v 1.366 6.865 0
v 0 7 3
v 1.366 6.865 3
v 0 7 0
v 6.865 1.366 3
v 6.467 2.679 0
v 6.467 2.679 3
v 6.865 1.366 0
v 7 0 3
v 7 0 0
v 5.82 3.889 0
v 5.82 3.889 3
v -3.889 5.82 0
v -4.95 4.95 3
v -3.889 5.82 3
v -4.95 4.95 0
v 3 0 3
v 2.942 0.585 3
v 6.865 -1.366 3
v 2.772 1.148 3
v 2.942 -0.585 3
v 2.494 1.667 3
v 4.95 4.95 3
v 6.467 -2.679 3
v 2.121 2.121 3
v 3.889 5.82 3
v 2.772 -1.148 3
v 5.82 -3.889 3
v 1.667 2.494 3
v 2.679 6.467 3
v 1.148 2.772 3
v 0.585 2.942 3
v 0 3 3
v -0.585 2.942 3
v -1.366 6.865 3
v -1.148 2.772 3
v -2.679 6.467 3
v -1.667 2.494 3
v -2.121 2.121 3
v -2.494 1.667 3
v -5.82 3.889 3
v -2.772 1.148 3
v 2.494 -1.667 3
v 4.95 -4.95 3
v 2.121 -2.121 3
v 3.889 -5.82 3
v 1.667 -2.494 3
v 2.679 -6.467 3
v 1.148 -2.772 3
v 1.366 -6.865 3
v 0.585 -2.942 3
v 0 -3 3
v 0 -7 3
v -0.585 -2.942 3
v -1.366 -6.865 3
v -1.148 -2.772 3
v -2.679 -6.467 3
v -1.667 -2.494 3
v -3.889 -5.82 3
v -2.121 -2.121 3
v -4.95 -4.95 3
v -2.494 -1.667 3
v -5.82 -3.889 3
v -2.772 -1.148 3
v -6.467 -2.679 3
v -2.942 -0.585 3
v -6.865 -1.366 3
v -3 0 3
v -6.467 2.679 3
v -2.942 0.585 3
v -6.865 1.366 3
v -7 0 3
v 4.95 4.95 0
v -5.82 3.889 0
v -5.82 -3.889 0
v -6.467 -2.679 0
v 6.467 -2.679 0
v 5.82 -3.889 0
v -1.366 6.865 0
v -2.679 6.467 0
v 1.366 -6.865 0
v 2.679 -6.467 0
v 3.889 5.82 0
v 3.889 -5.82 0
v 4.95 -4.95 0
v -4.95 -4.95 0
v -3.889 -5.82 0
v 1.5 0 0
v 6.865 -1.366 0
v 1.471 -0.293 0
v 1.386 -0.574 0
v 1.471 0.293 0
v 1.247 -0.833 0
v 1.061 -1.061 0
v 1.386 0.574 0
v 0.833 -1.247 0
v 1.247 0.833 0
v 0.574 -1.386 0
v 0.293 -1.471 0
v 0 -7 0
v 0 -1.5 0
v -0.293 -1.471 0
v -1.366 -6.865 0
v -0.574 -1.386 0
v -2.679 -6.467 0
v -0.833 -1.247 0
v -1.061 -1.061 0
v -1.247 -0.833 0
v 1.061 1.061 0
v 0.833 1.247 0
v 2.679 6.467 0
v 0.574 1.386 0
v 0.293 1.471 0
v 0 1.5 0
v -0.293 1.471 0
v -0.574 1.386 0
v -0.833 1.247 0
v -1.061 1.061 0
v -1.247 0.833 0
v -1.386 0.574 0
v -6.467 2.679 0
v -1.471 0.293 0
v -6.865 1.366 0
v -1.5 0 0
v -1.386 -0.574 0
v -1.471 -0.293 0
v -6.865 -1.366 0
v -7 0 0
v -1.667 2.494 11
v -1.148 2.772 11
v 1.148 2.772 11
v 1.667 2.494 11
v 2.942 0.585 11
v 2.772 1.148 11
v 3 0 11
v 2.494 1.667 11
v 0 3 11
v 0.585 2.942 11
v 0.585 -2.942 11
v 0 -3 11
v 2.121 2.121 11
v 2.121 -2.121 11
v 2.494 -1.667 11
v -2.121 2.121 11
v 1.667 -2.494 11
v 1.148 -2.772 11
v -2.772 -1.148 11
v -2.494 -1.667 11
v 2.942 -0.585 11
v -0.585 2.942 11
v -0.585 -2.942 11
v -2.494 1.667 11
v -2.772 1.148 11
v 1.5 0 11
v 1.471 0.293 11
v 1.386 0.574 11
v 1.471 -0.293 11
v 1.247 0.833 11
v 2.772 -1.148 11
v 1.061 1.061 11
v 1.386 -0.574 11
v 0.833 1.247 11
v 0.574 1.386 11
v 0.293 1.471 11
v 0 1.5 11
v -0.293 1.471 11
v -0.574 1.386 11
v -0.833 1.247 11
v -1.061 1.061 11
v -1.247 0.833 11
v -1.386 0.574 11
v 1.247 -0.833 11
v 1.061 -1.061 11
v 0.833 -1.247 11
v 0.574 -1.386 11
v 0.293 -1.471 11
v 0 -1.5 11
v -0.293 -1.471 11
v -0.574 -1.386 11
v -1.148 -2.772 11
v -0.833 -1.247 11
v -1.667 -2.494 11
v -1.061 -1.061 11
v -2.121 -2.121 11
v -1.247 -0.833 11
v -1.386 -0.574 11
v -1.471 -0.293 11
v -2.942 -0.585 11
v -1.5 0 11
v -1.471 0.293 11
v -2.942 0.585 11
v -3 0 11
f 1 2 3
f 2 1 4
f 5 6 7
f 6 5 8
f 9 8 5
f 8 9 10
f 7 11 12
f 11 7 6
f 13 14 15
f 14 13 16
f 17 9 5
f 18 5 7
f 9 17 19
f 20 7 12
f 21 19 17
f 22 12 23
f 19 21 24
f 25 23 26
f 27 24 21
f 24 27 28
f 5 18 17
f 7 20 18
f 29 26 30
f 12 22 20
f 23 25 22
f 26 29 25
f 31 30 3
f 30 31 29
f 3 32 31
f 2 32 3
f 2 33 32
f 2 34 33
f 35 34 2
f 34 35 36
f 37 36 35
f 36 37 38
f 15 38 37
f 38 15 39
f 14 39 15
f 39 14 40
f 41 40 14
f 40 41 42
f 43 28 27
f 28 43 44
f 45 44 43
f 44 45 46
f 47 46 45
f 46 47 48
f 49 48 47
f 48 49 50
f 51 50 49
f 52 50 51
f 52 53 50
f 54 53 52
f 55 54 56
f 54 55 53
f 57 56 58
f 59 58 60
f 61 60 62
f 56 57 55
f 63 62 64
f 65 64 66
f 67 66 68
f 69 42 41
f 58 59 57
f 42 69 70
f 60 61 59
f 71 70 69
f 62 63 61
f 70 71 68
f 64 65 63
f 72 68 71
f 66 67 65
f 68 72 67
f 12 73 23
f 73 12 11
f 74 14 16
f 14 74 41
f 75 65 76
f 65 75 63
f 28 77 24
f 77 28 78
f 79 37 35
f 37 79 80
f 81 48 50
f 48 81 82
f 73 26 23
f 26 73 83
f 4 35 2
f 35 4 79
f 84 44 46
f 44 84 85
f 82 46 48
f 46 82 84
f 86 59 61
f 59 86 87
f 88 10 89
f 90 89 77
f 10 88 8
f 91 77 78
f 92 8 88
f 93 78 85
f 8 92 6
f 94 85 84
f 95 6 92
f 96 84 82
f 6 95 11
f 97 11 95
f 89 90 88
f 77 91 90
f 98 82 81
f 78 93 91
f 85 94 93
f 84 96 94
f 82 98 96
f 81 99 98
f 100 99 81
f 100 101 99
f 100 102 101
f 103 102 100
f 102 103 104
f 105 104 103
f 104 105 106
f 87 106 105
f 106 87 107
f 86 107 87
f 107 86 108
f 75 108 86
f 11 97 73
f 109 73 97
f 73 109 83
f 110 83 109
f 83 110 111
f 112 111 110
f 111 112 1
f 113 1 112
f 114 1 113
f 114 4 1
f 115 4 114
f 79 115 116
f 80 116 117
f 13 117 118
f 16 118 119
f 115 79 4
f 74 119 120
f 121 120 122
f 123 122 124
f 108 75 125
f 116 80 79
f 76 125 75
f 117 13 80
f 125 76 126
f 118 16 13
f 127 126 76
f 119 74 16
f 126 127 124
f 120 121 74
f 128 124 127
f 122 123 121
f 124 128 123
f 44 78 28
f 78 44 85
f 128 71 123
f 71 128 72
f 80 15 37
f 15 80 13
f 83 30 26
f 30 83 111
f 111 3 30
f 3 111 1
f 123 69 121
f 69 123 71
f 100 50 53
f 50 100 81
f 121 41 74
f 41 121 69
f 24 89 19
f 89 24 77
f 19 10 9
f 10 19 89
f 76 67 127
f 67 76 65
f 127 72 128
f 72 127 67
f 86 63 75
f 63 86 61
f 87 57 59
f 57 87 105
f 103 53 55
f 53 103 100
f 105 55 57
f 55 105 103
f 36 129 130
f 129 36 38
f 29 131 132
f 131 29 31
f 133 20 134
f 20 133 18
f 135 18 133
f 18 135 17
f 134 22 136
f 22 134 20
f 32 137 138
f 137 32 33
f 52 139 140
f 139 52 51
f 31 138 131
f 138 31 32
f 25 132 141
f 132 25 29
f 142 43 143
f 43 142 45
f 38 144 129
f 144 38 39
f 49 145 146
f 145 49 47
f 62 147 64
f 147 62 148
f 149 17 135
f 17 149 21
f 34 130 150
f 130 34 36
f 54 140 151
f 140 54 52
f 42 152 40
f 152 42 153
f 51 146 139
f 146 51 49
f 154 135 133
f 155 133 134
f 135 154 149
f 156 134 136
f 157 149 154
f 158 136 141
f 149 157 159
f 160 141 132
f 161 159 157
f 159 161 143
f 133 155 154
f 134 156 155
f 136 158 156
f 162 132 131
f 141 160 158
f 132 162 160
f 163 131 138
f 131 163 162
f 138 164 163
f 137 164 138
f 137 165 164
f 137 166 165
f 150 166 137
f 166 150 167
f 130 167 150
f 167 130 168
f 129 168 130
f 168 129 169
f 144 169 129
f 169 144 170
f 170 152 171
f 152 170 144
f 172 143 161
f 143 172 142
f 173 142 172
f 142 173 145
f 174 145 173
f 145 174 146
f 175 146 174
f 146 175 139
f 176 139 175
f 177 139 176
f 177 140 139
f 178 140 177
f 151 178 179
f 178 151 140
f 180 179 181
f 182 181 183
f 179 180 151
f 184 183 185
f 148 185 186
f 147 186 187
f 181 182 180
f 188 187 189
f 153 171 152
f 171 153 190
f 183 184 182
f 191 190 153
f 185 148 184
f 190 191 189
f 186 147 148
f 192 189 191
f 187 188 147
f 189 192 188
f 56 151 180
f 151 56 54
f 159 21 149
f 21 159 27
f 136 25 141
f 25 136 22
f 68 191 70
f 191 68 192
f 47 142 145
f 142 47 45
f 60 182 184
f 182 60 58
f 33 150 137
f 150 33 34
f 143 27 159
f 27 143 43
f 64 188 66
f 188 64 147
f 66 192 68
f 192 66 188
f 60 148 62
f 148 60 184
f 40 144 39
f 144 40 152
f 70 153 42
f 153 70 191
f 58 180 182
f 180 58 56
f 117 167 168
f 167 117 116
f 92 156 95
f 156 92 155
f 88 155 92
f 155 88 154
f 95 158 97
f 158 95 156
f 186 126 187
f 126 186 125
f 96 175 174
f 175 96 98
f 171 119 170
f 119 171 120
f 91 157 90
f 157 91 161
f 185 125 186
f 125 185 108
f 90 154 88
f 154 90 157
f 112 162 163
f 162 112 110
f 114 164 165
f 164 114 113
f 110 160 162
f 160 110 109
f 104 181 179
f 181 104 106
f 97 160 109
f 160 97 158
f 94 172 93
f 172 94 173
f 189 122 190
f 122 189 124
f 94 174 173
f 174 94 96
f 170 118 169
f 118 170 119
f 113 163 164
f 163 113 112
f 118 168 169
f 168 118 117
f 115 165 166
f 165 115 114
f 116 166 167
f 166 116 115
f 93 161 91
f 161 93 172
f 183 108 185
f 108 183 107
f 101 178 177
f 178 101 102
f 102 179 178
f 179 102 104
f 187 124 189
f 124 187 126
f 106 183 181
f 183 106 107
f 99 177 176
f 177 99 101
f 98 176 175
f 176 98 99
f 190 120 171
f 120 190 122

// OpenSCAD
$fn = 32;

// ----------------------------------------------------------------------
// Micro post: flanged post, 5-20 mm class
// ----------------------------------------------------------------------

// --- parameters (mm) ---
post_d = 6;               // post diameter
post_h = 8;               // post height above the flange
flange_d = 14;            // flange diameter
flange_t = 3;             // flange thickness
bore_d = 3;               // through bore

total_h = post_h + flange_t;  // overall height

difference() {
  union() {
    cylinder(h = flange_t, d = flange_d);
    translate([0, 0, flange_t]) cylinder(h = post_h, d = post_d);
  }
  translate([0, 0, -1]) cylinder(h = total_h + 2, d = bore_d);
}
